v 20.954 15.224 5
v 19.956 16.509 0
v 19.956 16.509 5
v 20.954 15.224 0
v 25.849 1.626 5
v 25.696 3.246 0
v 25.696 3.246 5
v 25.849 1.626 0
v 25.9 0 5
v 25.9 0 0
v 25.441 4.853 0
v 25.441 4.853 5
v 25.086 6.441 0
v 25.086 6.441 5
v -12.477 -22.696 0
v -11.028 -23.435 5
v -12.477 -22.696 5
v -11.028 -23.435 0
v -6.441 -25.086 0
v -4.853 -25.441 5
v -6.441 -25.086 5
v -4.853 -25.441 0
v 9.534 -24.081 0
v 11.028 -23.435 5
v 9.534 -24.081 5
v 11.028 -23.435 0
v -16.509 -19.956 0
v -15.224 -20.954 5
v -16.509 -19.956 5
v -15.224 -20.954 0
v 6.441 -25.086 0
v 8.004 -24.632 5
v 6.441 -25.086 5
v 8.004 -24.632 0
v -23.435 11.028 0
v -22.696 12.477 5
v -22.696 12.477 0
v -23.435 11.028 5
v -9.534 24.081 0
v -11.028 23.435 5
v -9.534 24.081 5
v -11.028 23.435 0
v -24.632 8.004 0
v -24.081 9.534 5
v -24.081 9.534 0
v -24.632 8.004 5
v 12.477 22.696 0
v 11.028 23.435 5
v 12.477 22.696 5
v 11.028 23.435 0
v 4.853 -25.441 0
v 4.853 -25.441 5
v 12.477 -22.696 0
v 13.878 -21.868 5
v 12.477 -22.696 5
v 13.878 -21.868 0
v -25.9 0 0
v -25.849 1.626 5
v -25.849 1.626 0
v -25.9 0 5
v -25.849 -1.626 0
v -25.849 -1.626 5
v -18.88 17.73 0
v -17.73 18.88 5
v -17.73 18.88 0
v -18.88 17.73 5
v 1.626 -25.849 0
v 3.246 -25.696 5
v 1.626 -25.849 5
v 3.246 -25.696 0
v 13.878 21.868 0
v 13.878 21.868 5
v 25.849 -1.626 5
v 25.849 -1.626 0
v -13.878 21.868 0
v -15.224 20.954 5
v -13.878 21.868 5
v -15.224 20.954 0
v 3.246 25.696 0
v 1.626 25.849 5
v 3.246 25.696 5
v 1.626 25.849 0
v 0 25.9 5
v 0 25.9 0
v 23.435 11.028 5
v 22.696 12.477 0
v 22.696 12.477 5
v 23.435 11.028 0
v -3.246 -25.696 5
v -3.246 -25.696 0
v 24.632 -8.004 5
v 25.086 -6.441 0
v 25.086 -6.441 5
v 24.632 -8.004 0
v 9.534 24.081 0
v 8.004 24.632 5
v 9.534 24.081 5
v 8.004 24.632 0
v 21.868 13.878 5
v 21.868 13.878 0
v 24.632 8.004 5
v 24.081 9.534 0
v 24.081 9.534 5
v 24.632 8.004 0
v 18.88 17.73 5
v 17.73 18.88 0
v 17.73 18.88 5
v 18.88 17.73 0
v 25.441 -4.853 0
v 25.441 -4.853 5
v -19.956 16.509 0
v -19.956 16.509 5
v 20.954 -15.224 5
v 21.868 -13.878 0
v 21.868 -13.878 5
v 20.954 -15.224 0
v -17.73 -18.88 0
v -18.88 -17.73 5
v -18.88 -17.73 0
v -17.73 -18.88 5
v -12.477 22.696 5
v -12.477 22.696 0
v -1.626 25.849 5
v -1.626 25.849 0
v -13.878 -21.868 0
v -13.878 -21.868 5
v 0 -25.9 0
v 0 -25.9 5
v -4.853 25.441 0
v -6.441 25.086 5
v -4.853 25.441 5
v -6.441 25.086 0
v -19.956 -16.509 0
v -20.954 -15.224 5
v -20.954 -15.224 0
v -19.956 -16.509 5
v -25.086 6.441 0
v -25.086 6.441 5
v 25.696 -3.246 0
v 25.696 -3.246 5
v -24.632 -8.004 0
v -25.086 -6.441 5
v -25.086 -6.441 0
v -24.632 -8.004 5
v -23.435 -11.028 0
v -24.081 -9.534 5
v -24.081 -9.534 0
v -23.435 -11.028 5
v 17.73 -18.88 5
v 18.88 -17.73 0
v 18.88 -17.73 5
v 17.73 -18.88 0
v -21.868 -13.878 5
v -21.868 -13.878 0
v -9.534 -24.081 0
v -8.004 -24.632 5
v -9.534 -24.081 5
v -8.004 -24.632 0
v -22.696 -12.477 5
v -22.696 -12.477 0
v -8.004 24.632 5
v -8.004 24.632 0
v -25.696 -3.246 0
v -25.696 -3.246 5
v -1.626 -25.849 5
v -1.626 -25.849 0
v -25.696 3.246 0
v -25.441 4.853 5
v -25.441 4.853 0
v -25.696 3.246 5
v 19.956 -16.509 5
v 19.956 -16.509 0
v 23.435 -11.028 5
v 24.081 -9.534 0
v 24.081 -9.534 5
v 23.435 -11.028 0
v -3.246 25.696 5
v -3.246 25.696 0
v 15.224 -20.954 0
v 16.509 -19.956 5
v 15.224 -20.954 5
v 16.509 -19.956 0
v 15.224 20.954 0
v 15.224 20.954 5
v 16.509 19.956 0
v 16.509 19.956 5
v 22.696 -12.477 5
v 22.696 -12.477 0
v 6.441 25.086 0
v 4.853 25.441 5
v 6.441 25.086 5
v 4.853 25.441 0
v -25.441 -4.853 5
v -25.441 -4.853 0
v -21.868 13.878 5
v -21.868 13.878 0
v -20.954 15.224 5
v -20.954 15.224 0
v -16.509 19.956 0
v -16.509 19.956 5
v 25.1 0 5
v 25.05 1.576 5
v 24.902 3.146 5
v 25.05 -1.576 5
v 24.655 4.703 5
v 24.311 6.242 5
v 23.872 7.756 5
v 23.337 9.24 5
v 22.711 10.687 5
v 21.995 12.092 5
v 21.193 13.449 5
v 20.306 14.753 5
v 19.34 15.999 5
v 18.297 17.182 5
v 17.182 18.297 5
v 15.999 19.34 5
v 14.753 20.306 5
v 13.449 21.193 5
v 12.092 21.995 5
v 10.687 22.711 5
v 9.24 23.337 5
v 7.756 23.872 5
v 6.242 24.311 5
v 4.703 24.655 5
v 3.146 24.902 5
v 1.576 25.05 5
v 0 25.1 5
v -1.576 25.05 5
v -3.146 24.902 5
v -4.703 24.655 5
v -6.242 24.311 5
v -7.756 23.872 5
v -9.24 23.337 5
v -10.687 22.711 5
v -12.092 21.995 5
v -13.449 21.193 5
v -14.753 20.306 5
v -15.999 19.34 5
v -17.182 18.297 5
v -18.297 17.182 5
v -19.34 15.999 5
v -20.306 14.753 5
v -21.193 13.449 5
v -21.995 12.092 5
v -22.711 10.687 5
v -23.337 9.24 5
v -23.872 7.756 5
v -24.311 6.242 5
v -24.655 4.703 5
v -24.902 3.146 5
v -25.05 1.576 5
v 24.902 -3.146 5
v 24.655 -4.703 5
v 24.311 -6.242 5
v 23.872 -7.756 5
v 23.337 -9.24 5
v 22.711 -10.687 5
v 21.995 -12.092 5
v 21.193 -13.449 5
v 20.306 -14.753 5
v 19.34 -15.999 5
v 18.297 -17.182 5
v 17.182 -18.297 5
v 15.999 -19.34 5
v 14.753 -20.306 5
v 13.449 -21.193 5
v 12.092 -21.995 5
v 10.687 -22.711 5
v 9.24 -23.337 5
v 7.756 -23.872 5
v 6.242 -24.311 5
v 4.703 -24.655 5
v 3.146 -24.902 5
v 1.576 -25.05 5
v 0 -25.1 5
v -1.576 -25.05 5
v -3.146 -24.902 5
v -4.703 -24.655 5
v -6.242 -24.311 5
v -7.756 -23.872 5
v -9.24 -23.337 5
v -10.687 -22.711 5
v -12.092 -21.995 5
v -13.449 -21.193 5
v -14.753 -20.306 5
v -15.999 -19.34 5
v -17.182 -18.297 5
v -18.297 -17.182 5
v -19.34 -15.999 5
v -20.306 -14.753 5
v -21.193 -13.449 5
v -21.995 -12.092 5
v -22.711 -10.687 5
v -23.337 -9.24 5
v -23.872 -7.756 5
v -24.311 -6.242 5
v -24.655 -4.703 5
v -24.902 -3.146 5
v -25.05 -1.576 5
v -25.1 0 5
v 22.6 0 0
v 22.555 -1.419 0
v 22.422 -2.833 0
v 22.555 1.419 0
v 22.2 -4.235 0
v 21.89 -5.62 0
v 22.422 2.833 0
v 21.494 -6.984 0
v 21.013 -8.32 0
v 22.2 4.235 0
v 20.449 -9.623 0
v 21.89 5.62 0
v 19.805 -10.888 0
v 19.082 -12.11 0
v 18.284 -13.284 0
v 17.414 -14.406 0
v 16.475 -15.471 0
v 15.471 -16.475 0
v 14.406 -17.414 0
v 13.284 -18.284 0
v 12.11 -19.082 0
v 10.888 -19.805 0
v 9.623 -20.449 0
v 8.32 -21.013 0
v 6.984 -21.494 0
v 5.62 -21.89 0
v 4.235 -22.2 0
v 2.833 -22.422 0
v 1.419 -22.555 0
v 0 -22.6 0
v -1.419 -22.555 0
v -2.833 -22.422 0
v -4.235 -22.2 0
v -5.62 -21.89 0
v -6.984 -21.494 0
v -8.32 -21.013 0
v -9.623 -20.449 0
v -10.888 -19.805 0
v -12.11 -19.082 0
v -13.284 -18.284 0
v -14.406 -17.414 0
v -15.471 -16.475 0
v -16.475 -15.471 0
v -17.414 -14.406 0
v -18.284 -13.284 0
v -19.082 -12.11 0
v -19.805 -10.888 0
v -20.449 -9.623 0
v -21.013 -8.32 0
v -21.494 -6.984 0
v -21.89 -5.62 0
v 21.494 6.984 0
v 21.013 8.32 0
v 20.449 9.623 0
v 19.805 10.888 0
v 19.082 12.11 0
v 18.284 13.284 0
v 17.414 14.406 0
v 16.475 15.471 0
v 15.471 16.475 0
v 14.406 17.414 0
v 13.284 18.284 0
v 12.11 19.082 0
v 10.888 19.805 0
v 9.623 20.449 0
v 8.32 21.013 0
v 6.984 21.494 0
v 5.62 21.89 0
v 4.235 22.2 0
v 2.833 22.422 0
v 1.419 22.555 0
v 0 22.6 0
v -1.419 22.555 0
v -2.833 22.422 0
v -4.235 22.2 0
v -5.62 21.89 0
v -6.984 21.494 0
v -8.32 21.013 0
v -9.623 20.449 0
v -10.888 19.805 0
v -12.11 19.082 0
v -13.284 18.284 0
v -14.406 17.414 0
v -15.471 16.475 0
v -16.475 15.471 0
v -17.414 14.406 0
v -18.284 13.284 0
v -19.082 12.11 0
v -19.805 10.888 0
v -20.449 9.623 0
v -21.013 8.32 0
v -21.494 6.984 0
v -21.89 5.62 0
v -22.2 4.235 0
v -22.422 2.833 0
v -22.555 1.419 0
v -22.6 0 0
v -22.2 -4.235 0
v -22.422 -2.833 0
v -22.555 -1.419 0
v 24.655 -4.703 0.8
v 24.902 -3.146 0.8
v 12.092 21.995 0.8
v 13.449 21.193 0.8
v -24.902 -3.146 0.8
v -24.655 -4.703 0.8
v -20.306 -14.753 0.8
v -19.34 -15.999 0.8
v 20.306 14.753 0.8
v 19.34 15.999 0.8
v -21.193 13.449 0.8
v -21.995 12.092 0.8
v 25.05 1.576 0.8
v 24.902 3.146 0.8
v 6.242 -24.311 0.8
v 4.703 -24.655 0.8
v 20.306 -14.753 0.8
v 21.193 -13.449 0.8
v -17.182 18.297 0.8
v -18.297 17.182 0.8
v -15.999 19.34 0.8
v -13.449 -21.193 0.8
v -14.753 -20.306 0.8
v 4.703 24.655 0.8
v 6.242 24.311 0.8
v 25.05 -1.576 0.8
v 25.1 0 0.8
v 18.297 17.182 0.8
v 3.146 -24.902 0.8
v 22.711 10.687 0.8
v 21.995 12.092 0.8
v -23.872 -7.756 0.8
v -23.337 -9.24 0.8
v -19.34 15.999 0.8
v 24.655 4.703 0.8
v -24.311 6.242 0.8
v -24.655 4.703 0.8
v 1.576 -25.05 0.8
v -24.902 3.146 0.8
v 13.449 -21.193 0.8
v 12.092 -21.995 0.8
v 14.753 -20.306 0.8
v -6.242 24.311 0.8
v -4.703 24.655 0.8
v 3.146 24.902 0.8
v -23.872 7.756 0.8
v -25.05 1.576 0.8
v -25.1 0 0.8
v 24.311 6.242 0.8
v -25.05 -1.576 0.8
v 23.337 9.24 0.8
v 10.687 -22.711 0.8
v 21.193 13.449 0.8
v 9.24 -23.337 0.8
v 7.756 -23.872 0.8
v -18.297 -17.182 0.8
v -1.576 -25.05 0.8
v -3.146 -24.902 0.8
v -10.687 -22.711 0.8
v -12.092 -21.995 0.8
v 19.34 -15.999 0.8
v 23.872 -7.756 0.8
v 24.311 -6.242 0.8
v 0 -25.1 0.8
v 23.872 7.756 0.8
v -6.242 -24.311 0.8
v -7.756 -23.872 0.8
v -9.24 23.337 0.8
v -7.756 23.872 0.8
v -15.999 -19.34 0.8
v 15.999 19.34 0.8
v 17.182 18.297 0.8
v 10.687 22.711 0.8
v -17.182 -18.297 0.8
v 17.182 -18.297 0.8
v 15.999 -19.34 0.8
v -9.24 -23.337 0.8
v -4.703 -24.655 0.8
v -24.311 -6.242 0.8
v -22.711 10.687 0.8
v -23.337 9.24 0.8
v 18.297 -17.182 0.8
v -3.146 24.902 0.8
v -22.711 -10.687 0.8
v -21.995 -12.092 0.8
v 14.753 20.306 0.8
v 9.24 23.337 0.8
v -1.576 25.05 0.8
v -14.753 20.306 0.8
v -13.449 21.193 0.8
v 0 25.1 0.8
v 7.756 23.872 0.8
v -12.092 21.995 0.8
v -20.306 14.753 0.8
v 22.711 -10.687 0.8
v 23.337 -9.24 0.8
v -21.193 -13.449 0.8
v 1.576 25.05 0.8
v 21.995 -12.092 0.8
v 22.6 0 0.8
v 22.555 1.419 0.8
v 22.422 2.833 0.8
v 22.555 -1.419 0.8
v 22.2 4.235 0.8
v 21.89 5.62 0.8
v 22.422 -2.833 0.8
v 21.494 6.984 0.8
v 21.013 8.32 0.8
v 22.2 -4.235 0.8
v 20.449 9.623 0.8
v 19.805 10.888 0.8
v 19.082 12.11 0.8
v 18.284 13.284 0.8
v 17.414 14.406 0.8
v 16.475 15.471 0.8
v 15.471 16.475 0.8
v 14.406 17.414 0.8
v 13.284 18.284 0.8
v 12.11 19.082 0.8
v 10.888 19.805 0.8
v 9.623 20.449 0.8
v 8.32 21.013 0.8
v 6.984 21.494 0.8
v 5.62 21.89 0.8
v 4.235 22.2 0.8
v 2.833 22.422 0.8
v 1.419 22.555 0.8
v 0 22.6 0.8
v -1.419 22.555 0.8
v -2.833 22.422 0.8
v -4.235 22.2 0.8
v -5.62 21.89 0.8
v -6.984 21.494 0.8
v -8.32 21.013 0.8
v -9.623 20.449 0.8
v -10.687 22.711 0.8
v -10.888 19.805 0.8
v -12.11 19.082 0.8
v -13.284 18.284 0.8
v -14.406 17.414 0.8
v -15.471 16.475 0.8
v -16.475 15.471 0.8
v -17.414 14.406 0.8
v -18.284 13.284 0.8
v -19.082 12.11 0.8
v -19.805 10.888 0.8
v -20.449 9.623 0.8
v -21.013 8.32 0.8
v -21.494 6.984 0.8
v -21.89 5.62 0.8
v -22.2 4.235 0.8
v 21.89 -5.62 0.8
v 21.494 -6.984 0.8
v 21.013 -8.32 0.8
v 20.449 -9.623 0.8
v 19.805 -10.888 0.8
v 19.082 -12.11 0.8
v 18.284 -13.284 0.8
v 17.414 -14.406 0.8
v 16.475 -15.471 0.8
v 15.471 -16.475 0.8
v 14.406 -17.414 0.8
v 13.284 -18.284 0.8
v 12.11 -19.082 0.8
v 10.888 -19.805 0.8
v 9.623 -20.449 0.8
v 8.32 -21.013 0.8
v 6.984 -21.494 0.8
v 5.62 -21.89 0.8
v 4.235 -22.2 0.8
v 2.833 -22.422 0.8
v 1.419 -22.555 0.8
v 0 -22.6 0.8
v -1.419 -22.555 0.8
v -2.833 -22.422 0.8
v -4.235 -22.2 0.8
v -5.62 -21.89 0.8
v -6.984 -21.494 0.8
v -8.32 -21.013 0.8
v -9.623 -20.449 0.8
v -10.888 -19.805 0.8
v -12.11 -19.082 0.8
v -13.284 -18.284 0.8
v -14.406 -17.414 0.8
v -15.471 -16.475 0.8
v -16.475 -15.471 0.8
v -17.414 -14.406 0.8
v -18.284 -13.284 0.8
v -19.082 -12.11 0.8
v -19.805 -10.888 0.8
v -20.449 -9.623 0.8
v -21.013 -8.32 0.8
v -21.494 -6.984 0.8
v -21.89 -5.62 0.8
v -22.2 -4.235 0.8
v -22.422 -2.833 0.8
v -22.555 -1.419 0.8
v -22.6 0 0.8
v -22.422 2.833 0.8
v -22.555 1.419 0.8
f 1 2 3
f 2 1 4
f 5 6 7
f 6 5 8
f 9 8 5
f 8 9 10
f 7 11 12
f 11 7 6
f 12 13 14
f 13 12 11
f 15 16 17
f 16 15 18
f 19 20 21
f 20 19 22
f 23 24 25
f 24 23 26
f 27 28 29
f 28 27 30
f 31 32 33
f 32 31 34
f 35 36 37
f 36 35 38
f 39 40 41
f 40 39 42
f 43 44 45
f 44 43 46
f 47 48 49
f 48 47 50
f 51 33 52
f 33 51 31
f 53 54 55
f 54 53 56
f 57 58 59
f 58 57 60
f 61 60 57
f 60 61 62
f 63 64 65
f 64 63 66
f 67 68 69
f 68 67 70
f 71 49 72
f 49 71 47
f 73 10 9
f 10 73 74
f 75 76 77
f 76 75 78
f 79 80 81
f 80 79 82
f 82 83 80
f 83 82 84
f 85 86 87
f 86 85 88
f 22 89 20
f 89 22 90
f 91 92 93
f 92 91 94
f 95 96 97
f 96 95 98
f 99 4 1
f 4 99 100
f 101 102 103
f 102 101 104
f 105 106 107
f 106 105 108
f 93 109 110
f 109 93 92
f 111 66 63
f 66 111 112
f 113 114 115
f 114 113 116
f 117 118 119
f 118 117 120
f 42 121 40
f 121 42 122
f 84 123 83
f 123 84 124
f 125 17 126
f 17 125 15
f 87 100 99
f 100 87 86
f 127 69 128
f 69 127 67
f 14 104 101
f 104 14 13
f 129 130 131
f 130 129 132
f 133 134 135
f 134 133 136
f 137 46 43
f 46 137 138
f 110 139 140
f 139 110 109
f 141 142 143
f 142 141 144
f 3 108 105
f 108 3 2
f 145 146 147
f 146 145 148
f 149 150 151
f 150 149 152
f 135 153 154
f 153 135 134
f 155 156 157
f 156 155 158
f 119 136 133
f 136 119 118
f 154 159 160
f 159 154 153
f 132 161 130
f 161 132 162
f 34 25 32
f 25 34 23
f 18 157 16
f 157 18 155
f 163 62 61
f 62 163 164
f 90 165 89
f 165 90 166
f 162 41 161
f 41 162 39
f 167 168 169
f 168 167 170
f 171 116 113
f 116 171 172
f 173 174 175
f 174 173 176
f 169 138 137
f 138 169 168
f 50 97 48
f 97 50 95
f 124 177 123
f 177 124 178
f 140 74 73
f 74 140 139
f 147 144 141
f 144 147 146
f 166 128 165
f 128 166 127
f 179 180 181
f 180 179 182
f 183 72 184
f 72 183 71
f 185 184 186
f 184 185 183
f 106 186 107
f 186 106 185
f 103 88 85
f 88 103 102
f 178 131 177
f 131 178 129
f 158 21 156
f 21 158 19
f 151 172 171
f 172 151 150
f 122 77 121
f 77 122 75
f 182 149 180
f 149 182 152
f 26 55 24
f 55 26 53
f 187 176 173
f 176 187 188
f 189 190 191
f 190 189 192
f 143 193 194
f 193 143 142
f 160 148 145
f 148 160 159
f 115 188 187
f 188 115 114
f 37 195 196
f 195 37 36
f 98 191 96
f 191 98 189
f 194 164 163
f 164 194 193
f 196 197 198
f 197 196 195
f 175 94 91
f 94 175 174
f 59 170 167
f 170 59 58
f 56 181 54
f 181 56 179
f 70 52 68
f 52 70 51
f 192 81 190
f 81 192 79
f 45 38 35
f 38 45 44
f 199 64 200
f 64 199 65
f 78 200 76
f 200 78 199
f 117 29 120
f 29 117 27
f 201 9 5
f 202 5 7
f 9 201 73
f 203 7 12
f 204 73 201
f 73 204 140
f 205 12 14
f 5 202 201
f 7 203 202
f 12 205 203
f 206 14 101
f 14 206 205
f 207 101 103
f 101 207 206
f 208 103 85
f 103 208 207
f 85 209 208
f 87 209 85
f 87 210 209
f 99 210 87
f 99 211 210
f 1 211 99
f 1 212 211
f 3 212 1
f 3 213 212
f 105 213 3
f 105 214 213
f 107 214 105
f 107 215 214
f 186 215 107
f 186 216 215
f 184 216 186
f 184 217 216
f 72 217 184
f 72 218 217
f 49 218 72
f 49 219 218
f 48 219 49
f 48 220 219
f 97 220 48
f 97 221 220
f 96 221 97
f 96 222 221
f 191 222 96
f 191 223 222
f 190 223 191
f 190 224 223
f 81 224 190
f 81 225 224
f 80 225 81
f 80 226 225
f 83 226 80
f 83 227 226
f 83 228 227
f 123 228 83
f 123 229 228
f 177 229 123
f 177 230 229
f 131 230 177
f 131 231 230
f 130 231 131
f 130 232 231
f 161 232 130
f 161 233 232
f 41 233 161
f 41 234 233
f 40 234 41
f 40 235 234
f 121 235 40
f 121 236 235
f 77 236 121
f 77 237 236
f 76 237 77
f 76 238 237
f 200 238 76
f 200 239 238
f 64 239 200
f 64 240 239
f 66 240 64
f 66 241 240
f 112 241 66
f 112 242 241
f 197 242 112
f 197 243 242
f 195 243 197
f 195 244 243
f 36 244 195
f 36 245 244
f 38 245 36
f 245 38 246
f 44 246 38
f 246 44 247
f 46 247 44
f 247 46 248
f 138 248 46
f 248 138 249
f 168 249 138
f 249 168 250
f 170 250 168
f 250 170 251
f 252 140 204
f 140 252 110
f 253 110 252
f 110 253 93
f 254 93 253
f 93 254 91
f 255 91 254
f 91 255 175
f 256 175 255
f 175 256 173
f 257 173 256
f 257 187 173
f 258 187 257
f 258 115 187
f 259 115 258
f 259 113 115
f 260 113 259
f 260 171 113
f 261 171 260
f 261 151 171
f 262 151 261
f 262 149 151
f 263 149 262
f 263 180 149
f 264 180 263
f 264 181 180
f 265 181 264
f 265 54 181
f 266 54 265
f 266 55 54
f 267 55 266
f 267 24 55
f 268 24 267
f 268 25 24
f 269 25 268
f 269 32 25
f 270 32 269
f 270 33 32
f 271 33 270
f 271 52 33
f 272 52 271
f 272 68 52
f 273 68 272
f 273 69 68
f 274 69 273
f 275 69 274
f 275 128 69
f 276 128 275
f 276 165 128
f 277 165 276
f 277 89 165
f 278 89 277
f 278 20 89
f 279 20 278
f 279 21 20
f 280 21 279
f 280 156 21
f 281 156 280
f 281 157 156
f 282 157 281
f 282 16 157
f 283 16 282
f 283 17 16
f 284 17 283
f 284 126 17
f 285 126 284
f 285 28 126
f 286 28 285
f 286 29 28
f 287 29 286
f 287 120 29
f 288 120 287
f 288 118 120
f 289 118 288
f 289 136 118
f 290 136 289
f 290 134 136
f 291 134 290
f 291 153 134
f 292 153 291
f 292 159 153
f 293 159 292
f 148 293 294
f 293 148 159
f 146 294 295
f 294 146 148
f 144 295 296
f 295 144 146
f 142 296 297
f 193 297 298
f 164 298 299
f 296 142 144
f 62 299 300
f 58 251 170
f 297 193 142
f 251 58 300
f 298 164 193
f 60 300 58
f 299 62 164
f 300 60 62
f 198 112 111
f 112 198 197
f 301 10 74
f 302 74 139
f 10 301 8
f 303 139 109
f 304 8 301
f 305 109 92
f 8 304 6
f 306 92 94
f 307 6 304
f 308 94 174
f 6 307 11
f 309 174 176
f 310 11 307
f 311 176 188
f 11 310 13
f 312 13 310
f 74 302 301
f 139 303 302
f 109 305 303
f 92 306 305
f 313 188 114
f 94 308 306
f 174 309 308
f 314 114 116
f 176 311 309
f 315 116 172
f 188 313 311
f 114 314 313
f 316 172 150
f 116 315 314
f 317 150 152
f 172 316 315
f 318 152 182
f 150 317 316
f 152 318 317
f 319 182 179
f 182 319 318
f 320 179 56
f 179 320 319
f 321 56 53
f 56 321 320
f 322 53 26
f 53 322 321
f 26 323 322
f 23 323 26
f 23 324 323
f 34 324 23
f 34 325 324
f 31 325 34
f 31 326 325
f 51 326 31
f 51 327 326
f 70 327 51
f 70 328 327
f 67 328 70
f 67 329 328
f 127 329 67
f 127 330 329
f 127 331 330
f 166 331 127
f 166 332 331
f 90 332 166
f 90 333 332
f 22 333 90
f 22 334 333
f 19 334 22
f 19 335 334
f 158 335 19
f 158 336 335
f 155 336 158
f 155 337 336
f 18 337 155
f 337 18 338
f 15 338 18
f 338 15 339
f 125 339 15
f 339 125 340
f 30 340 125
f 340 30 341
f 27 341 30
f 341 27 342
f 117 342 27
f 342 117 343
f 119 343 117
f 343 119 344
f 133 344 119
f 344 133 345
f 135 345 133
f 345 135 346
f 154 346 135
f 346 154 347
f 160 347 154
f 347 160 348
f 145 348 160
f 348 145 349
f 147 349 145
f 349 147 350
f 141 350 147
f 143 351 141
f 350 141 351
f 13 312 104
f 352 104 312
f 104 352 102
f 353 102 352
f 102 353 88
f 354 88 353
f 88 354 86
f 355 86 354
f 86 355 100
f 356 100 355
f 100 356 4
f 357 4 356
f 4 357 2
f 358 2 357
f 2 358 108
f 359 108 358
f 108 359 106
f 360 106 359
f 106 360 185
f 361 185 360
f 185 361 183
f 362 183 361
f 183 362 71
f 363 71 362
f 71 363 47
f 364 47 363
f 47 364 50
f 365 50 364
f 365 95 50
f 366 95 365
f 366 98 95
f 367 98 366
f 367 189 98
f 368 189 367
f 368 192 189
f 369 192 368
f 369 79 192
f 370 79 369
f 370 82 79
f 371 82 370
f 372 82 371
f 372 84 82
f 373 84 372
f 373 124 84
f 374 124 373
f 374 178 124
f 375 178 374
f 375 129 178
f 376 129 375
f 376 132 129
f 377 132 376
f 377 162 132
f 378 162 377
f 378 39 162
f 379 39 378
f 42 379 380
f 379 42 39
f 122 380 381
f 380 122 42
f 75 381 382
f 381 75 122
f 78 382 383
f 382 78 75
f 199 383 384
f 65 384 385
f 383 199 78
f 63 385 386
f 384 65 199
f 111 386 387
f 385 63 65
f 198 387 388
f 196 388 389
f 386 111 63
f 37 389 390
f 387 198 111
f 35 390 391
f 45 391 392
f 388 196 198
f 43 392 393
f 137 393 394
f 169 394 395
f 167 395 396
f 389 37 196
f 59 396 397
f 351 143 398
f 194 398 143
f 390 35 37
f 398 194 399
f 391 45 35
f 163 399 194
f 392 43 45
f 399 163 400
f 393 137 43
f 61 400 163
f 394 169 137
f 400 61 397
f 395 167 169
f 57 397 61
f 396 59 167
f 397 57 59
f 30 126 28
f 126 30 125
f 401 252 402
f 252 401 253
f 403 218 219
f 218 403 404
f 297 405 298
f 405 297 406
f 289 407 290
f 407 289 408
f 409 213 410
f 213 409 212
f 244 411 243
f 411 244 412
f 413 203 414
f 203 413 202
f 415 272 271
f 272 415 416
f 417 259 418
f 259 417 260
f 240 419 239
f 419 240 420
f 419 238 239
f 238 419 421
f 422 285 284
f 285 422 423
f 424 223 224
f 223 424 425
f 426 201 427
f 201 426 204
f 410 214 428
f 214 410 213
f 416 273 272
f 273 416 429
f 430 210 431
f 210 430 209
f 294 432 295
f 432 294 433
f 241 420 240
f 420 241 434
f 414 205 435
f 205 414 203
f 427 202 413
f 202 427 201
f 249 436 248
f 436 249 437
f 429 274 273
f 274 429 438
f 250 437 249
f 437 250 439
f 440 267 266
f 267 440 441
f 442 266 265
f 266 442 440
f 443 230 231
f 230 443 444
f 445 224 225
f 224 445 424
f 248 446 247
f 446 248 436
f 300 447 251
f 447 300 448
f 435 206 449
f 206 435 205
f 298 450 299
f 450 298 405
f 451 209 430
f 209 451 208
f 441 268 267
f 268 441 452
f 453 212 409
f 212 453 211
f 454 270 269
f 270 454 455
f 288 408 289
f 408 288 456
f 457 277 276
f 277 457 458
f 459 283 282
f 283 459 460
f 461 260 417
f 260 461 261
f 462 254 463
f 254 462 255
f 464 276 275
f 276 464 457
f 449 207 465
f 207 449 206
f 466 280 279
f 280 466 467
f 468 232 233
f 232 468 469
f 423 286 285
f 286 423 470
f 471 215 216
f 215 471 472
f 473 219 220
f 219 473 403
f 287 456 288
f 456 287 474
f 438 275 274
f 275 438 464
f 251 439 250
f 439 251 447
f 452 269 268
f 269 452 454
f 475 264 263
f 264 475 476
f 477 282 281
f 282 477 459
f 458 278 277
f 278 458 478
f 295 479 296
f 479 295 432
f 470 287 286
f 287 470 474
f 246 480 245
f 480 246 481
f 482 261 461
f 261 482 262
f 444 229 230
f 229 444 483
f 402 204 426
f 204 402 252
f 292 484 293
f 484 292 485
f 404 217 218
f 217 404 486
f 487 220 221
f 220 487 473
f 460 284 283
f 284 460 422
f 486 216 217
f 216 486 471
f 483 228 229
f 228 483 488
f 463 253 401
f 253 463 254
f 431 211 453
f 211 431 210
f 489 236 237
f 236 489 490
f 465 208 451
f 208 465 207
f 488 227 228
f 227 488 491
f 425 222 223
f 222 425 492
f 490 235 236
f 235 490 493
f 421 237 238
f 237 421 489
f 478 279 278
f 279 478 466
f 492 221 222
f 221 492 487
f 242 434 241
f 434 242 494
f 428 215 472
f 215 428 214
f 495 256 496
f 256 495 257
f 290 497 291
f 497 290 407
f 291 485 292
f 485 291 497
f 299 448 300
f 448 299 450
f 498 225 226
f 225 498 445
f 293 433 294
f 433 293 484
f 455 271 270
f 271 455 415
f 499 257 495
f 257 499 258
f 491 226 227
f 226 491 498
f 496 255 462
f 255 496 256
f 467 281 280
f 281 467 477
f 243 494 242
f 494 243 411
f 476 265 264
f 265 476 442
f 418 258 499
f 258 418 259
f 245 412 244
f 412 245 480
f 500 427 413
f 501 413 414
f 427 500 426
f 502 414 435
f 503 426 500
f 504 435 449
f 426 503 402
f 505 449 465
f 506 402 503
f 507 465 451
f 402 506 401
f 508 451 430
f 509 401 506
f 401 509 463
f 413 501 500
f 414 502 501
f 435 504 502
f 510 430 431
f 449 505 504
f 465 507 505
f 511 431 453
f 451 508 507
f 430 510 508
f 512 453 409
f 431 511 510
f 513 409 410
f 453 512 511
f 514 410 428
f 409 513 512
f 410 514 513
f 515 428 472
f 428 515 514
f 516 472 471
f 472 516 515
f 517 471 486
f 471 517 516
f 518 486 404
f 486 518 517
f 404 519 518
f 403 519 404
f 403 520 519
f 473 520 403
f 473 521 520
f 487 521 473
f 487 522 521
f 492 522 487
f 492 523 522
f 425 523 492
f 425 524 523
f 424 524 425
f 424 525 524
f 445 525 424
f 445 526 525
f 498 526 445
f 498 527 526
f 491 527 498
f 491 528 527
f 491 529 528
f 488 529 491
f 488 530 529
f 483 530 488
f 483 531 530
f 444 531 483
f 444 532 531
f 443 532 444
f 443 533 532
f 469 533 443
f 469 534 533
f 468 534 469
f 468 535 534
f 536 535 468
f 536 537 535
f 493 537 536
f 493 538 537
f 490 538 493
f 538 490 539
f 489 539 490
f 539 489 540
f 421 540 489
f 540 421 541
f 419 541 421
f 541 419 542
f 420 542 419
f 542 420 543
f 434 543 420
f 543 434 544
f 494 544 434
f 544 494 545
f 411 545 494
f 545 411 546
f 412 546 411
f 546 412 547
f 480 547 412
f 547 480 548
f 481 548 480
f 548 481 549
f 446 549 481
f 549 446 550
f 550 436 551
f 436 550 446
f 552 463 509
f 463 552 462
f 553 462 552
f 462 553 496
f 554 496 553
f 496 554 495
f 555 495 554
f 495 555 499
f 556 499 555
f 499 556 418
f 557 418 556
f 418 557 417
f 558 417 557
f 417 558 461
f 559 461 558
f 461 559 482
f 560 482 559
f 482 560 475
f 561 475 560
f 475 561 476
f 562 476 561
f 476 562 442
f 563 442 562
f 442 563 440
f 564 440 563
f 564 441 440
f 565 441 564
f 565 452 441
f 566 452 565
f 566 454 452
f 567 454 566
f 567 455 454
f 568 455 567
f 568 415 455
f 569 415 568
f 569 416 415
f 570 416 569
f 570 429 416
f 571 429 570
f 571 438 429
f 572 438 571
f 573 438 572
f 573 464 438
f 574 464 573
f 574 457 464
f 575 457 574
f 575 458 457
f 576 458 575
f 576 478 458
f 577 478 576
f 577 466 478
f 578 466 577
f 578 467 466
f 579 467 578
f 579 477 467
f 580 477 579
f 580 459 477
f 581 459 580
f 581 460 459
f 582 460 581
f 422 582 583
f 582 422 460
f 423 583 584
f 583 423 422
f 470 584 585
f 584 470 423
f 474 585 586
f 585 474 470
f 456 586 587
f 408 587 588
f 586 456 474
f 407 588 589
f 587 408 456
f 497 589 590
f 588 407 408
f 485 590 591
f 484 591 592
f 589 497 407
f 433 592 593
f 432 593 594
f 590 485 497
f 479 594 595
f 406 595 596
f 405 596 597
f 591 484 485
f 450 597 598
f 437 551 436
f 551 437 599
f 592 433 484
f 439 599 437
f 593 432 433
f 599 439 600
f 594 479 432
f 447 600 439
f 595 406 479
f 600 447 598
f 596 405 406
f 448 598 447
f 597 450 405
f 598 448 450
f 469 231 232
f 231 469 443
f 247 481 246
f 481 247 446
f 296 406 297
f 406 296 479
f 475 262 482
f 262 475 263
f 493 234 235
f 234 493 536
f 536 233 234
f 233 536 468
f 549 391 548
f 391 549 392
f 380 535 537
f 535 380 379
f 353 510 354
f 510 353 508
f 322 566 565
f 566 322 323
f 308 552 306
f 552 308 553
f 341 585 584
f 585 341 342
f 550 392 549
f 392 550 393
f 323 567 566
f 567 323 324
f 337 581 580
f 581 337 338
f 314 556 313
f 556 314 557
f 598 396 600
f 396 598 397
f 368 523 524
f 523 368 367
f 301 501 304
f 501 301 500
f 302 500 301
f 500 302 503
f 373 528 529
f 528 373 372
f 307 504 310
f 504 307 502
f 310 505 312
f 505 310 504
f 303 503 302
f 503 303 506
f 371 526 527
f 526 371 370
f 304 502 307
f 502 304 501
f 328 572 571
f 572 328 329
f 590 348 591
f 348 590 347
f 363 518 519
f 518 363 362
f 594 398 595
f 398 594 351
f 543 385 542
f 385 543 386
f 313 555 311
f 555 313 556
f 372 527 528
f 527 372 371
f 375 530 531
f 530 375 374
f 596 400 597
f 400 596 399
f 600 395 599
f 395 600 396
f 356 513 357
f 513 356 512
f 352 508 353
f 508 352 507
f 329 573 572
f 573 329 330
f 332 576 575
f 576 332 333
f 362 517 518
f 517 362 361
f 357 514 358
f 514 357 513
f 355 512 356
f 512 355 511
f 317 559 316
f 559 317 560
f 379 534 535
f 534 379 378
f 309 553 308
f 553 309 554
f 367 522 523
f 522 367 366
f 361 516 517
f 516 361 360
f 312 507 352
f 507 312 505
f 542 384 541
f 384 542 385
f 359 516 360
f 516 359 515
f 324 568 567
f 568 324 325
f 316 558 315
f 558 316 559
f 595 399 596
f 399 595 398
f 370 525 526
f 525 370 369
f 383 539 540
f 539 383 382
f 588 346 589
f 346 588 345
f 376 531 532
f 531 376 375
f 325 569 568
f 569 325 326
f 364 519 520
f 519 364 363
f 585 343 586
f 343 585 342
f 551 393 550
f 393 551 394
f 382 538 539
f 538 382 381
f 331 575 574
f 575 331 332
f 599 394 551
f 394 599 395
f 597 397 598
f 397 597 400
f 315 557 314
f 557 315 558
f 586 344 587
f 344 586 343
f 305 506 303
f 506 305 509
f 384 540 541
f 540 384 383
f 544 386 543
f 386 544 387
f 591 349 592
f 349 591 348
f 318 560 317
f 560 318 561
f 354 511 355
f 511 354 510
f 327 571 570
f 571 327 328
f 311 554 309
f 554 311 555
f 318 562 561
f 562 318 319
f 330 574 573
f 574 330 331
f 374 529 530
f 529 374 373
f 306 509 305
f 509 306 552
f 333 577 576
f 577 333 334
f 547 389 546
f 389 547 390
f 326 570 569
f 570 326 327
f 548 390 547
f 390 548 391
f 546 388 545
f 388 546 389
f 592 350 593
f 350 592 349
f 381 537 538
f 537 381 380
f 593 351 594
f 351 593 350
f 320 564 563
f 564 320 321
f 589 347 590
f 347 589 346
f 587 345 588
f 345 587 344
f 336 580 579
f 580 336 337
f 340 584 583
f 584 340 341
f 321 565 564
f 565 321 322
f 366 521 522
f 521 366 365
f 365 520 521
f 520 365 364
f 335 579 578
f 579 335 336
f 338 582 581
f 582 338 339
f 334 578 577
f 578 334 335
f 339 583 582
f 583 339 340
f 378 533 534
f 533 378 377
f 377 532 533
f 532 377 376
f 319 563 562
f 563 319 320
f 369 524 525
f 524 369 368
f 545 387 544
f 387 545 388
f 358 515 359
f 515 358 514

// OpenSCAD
thickness = 0.8;

d = 21.8+0.1;

//part_a();
//part_b();
//part_c();
part_d();

module part_d() {
    $fn = 100;
    d=50+0.2;
    difference() {
        cylinder(d=d+thickness*2, h=5);
        translate([0, 0, thickness]) cylinder(d=d, h=5);
        cylinder(d=d-5, h=5);
    }
}

module part_c() {
    $fn = 100;
    translate([0, (20+thickness*2)/2]) difference() {
        cylinder(d=20+thickness*2, h = 10);
        cylinder(d=20, h=10);
        for(i=[0:7]) {
            if (i != 0) {
                rotate([0, 0, 360/8*i])
                    translate([0, 0, 10/2])
                    rotate([90, 0])
                    cylinder(h=99.99, d = 6, $fn = 30);
            }
        }
    }
    difference() {
        translate([0, (50)/2]) cylinder(d=50, h=10);
        translate([0, (50)/2, thickness]) cylinder(d=50-thickness*2, h=10);
        translate([0, (20+thickness*2)/2]) cylinder(d=20, h = 10);
    }
    /*difference() {
        hull() {
            translate([0, (20+thickness*2)/2]) cylinder(d=20+thickness*2, h=10);
            translate([0, (50+thickness*2)/2, 10]) cylinder(d=50+thickness*2, h=5);
        }
        hull() {
            translate([0, (20+thickness*2)/2]) cylinder(d=20, h=10);
            translate([0, (50+thickness*2)/2, 10]) cylinder(d=50, h=5);
        }
    }*/
}

module part_b() {
    $fn = 100;
    base();
    difference() {
        cylinder(d=20, h=10);
        cylinder(d=20-thickness*2, h = 10);
        for(i=[0:7]) {
            rotate([0, 0, 360/8*i])
                translate([0, 0, 10/2])
                rotate([90, 0])
                cylinder(h=99.99, d = 6, $fn = 30);
        }
    }
}

module part_a() {
    base();
    translate([0, 0, -6]) linear_extrude(height = 6) difference() {
        circle(d=d, $fn=100);
        circle(d=d-thickness*2, $fn=100);
        translate([-8/2, 0]) square([8, 99]);
    }
}

module base() difference() {
    translate([-d/2-10, -d/2-2.5]) cube([d+2+10, d+2.5+0.8, 0.6]);
    cylinder(d=7.5, h = 9.9, $fn = 50);
}
